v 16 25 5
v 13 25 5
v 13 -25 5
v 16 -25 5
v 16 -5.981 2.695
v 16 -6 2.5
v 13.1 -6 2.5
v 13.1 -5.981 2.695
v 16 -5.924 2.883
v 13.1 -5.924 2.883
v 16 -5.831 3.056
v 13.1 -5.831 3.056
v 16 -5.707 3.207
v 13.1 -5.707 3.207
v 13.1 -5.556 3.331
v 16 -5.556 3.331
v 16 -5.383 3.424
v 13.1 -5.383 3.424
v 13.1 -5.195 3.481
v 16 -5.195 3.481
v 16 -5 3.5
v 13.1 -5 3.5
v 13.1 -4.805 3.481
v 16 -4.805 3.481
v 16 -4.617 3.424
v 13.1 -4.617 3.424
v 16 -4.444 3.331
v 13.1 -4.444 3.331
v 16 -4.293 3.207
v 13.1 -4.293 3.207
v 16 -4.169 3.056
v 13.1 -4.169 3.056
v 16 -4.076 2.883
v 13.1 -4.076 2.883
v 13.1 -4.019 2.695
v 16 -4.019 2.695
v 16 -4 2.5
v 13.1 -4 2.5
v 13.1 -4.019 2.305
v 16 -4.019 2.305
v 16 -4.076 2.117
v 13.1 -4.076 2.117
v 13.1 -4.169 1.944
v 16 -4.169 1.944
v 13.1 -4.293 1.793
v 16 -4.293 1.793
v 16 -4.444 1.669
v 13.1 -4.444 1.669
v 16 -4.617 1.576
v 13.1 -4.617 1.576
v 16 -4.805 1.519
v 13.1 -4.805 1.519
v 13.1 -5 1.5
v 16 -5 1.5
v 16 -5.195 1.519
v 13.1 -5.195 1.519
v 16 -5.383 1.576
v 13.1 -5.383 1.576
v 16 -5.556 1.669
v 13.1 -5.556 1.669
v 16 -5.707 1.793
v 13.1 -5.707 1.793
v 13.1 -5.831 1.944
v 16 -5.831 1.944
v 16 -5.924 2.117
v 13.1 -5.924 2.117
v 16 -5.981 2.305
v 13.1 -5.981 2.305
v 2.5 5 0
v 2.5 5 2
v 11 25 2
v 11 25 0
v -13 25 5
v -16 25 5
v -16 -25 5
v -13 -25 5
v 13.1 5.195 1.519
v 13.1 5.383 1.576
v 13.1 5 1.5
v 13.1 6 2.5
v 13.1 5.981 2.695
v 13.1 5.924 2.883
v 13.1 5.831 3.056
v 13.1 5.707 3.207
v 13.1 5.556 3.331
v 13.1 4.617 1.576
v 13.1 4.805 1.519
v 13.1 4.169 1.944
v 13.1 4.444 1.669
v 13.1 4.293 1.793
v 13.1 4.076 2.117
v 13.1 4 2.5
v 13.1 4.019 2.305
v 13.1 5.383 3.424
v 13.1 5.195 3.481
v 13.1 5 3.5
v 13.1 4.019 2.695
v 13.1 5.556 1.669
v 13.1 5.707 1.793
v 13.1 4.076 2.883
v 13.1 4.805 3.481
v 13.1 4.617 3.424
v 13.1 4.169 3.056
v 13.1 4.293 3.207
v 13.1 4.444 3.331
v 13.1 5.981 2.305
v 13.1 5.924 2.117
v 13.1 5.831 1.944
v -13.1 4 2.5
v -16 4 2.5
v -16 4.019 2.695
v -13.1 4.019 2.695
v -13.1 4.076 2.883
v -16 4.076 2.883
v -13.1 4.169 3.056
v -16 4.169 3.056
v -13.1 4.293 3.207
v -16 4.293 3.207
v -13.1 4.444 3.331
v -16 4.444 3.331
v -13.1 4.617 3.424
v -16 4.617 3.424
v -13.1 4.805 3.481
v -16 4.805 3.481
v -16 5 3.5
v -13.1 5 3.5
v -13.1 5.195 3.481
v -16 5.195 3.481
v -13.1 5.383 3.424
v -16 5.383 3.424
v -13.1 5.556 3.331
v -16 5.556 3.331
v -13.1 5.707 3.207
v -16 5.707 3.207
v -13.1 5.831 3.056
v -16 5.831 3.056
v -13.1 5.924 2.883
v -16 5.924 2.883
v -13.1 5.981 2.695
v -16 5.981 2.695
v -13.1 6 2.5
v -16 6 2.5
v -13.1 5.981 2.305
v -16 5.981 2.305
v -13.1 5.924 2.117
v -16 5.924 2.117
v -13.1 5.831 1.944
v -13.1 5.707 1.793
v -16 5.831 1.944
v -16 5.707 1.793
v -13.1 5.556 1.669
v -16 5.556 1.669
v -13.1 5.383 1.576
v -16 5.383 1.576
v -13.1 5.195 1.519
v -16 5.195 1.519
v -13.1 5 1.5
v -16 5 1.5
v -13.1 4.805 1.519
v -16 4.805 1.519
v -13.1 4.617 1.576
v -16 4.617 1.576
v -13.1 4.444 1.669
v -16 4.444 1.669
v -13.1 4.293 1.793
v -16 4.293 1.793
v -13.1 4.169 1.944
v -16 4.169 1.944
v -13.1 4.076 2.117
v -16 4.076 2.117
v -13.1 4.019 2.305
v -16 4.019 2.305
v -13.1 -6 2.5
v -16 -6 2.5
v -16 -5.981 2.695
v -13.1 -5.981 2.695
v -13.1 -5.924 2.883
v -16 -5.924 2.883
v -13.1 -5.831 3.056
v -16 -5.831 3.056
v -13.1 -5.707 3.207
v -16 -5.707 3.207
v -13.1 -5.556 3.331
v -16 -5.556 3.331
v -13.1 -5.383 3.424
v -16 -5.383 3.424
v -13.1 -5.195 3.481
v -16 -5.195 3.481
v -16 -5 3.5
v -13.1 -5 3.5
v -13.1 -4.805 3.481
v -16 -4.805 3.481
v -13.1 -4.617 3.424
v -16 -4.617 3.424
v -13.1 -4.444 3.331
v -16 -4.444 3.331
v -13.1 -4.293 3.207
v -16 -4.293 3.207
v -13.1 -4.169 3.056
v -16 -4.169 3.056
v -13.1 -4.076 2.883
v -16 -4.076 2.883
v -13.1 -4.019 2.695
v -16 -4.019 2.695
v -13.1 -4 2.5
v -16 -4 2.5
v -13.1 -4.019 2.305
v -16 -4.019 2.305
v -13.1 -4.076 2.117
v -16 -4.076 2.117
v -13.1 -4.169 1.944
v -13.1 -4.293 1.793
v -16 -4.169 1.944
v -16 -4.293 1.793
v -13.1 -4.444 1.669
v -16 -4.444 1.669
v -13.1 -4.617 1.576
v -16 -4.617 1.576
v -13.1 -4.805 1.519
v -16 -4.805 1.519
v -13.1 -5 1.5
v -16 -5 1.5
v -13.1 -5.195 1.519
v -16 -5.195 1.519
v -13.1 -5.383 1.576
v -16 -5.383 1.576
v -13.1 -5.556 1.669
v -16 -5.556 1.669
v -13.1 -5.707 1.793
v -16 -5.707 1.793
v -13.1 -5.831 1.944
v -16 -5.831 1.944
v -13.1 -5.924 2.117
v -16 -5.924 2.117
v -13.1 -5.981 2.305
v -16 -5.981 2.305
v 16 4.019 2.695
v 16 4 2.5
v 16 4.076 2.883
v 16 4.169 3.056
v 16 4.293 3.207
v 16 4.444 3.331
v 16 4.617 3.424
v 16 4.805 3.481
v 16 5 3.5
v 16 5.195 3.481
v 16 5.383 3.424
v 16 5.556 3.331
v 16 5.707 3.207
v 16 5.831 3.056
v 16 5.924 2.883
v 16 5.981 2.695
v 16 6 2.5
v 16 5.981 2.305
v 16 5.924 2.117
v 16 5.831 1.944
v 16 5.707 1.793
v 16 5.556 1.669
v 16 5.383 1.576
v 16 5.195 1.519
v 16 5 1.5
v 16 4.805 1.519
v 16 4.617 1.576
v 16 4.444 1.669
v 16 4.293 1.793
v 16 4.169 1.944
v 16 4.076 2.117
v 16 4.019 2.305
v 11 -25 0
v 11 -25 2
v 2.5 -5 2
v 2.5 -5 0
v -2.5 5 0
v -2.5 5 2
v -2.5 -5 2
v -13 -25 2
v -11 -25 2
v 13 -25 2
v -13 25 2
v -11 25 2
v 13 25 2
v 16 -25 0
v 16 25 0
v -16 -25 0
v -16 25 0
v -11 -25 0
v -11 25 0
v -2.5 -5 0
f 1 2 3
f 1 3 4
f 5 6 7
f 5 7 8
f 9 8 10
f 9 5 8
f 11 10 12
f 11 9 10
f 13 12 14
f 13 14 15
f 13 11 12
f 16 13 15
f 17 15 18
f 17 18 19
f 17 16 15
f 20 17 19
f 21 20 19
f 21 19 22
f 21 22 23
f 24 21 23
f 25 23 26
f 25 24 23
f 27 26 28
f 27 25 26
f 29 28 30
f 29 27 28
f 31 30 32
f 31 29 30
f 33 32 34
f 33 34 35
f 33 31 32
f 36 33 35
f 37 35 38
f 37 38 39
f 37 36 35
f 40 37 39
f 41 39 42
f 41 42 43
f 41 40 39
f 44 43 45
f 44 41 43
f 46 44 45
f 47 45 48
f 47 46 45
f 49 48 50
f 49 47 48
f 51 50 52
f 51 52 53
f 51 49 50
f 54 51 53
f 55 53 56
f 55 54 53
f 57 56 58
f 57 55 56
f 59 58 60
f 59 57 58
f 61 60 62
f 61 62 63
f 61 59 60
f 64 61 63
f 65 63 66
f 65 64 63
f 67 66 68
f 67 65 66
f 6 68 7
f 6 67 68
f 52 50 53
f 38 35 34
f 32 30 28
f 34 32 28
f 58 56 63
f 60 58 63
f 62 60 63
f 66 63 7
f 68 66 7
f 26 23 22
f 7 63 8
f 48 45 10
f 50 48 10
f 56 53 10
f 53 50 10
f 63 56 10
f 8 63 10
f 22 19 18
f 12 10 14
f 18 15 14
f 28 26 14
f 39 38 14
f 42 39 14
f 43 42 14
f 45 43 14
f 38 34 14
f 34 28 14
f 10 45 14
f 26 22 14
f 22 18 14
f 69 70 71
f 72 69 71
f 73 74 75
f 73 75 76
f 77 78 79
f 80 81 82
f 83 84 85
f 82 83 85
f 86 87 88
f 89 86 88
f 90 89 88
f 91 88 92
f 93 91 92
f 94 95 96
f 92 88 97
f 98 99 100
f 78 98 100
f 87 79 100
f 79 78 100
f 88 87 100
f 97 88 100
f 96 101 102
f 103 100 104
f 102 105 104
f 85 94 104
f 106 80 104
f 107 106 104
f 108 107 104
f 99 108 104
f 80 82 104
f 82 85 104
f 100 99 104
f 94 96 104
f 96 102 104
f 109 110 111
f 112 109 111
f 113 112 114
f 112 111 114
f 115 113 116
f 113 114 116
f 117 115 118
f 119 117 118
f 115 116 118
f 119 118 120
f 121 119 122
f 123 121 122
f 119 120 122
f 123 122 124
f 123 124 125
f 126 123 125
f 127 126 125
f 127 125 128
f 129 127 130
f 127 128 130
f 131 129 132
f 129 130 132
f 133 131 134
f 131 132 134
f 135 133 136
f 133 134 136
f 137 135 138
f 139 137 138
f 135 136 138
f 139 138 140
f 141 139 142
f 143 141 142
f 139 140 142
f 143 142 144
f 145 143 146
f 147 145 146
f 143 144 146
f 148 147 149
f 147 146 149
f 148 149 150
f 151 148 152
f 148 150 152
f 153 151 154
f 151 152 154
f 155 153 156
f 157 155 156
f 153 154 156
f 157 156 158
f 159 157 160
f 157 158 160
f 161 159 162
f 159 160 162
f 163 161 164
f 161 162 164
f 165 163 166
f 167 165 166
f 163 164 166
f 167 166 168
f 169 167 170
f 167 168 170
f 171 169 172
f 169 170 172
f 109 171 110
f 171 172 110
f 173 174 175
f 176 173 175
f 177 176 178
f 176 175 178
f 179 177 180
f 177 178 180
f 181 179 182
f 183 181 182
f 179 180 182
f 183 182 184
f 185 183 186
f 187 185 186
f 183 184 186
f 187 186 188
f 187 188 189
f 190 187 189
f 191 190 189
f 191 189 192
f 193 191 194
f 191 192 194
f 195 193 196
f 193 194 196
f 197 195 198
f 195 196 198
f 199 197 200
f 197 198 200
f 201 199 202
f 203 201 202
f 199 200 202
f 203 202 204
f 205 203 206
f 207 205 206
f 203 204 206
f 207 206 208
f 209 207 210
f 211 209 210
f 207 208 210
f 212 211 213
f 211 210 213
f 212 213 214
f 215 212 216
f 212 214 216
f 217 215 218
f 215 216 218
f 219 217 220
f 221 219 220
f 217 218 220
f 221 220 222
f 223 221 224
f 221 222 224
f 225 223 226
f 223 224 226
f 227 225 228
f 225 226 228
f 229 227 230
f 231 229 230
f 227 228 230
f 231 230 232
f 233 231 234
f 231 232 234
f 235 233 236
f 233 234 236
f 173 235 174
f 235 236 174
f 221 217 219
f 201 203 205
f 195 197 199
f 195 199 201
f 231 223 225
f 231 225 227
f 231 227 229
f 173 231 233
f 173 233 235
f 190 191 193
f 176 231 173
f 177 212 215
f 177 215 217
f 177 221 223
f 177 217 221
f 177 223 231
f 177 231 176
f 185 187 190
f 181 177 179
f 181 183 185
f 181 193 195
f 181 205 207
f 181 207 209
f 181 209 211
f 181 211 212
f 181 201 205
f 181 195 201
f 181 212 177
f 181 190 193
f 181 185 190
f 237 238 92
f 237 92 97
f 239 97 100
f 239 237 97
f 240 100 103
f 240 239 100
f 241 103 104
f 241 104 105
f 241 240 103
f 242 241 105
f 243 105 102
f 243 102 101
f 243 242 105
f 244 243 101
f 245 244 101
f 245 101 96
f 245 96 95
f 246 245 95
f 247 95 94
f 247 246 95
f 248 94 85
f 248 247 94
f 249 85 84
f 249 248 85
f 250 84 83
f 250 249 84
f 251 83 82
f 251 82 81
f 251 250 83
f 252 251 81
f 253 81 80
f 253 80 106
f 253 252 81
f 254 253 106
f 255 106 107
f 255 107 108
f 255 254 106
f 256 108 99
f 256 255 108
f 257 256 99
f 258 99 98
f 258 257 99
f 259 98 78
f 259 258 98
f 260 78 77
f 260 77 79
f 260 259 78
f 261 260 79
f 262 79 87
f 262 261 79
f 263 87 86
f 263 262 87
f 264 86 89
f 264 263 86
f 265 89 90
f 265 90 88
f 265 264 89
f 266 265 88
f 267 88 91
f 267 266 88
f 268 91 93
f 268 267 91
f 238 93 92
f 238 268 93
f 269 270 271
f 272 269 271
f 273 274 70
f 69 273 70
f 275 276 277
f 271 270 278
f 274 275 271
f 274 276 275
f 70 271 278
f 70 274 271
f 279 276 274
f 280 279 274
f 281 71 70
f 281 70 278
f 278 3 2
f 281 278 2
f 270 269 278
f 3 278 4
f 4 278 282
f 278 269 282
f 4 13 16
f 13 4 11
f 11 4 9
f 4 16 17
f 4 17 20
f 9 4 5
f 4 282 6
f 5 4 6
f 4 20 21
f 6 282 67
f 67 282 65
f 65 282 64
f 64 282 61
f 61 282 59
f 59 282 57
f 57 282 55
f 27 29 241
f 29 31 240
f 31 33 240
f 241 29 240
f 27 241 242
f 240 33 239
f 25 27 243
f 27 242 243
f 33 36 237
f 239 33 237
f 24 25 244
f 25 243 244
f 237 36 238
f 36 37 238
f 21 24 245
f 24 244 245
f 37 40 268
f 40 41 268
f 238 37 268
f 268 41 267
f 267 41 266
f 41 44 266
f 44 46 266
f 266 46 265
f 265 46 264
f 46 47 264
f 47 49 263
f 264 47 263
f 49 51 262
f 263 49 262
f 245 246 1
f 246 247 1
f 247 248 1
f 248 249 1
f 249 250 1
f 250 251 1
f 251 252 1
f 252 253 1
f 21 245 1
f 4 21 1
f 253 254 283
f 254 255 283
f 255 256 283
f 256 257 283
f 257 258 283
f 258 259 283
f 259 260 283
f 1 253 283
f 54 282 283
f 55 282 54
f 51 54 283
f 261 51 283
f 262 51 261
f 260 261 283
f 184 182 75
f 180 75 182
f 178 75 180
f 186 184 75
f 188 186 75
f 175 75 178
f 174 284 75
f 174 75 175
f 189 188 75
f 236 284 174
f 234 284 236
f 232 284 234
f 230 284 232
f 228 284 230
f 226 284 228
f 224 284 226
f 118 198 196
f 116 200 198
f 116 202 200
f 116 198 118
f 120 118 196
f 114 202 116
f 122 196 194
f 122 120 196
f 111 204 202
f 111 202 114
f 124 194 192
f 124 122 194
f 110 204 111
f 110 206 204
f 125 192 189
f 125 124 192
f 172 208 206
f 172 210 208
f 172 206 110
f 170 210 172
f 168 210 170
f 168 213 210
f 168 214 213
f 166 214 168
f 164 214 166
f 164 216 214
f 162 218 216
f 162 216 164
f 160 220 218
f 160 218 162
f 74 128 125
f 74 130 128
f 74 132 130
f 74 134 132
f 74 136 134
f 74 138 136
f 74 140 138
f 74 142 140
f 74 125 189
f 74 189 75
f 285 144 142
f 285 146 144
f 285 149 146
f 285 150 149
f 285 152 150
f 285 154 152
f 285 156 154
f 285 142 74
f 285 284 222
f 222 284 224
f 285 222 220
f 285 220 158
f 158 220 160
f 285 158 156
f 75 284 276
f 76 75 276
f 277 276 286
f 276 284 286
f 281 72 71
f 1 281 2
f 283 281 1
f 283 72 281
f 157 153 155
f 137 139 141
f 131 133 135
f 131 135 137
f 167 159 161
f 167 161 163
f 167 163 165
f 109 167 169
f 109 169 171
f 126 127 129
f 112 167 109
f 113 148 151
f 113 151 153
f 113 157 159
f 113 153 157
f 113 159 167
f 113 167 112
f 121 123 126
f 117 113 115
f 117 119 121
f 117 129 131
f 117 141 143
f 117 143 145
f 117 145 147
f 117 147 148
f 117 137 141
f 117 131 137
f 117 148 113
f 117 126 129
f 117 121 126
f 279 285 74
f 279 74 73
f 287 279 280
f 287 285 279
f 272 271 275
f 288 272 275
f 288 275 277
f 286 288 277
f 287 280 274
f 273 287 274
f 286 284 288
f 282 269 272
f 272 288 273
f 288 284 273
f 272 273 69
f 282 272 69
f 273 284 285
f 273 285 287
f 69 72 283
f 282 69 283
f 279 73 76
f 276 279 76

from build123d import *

# Parameters (mm, degrees)
F0_W     = 32
F0_H     = 50
F1_DEPTH = 5
F3_DEPTH = 5
F4_R     = 1
F5_DEPTH = 2.9
F7_DEPTH = 3


# Not quite as in the source:
# - a pattern or mirror of a feature is missing from the dataset's text; its kind, count and spacing are read off the source's solid


with BuildPart() as f1:
    # F0 (on Top) → F1 (new body)
    with BuildSketch(Plane.XY):
        Rectangle(F0_W, F0_H)
    extrude(amount=F1_DEPTH)

    # F2 (on face) → F3 (cut, through all)
    with BuildSketch(Plane.XY.offset(5)):
        Polygon((11, 25), (-11, 25), (-2.5, 5), (0, 5), (2.5, 5), align=None)
        Polygon((0, -5), (-2.5, -5), (-11, -25), (11, -25), (2.5, -5), align=None)
    extrude(amount=-F3_DEPTH, mode=Mode.SUBTRACT)

    # F4 (on face) → F5 (cut)
    with BuildSketch(Plane(origin=(-16, 0, 0), x_dir=(0, -1, 0), z_dir=(-1, 0, 0))):
        with Locations((-5, 2.5)):
            Circle(F4_R)
        with Locations((5, 2.5)):
            Circle(F4_R)
    f5 = extrude(amount=-F5_DEPTH, mode=Mode.SUBTRACT)

    # F5_copies: F5 across plane
    add(f5.mirror(Plane(origin=(0, 0, 0), x_dir=(0, 0, 1), z_dir=(1, 0, 0))), mode=Mode.SUBTRACT)

    # F6 (on face) → F7 (cut)
    with BuildSketch(Plane.XY.offset(5)):
        Polygon((-11, 25), (-13, 25), (-13, -25), (-11, -25), (-2.5, -5), (2.5, -5), (11, -25), (13, -25), (13, 25), (11, 25), (2.5, 5), (-2.5, 5), align=None)
    extrude(amount=-F7_DEPTH, mode=Mode.SUBTRACT)


solid = f1.part
